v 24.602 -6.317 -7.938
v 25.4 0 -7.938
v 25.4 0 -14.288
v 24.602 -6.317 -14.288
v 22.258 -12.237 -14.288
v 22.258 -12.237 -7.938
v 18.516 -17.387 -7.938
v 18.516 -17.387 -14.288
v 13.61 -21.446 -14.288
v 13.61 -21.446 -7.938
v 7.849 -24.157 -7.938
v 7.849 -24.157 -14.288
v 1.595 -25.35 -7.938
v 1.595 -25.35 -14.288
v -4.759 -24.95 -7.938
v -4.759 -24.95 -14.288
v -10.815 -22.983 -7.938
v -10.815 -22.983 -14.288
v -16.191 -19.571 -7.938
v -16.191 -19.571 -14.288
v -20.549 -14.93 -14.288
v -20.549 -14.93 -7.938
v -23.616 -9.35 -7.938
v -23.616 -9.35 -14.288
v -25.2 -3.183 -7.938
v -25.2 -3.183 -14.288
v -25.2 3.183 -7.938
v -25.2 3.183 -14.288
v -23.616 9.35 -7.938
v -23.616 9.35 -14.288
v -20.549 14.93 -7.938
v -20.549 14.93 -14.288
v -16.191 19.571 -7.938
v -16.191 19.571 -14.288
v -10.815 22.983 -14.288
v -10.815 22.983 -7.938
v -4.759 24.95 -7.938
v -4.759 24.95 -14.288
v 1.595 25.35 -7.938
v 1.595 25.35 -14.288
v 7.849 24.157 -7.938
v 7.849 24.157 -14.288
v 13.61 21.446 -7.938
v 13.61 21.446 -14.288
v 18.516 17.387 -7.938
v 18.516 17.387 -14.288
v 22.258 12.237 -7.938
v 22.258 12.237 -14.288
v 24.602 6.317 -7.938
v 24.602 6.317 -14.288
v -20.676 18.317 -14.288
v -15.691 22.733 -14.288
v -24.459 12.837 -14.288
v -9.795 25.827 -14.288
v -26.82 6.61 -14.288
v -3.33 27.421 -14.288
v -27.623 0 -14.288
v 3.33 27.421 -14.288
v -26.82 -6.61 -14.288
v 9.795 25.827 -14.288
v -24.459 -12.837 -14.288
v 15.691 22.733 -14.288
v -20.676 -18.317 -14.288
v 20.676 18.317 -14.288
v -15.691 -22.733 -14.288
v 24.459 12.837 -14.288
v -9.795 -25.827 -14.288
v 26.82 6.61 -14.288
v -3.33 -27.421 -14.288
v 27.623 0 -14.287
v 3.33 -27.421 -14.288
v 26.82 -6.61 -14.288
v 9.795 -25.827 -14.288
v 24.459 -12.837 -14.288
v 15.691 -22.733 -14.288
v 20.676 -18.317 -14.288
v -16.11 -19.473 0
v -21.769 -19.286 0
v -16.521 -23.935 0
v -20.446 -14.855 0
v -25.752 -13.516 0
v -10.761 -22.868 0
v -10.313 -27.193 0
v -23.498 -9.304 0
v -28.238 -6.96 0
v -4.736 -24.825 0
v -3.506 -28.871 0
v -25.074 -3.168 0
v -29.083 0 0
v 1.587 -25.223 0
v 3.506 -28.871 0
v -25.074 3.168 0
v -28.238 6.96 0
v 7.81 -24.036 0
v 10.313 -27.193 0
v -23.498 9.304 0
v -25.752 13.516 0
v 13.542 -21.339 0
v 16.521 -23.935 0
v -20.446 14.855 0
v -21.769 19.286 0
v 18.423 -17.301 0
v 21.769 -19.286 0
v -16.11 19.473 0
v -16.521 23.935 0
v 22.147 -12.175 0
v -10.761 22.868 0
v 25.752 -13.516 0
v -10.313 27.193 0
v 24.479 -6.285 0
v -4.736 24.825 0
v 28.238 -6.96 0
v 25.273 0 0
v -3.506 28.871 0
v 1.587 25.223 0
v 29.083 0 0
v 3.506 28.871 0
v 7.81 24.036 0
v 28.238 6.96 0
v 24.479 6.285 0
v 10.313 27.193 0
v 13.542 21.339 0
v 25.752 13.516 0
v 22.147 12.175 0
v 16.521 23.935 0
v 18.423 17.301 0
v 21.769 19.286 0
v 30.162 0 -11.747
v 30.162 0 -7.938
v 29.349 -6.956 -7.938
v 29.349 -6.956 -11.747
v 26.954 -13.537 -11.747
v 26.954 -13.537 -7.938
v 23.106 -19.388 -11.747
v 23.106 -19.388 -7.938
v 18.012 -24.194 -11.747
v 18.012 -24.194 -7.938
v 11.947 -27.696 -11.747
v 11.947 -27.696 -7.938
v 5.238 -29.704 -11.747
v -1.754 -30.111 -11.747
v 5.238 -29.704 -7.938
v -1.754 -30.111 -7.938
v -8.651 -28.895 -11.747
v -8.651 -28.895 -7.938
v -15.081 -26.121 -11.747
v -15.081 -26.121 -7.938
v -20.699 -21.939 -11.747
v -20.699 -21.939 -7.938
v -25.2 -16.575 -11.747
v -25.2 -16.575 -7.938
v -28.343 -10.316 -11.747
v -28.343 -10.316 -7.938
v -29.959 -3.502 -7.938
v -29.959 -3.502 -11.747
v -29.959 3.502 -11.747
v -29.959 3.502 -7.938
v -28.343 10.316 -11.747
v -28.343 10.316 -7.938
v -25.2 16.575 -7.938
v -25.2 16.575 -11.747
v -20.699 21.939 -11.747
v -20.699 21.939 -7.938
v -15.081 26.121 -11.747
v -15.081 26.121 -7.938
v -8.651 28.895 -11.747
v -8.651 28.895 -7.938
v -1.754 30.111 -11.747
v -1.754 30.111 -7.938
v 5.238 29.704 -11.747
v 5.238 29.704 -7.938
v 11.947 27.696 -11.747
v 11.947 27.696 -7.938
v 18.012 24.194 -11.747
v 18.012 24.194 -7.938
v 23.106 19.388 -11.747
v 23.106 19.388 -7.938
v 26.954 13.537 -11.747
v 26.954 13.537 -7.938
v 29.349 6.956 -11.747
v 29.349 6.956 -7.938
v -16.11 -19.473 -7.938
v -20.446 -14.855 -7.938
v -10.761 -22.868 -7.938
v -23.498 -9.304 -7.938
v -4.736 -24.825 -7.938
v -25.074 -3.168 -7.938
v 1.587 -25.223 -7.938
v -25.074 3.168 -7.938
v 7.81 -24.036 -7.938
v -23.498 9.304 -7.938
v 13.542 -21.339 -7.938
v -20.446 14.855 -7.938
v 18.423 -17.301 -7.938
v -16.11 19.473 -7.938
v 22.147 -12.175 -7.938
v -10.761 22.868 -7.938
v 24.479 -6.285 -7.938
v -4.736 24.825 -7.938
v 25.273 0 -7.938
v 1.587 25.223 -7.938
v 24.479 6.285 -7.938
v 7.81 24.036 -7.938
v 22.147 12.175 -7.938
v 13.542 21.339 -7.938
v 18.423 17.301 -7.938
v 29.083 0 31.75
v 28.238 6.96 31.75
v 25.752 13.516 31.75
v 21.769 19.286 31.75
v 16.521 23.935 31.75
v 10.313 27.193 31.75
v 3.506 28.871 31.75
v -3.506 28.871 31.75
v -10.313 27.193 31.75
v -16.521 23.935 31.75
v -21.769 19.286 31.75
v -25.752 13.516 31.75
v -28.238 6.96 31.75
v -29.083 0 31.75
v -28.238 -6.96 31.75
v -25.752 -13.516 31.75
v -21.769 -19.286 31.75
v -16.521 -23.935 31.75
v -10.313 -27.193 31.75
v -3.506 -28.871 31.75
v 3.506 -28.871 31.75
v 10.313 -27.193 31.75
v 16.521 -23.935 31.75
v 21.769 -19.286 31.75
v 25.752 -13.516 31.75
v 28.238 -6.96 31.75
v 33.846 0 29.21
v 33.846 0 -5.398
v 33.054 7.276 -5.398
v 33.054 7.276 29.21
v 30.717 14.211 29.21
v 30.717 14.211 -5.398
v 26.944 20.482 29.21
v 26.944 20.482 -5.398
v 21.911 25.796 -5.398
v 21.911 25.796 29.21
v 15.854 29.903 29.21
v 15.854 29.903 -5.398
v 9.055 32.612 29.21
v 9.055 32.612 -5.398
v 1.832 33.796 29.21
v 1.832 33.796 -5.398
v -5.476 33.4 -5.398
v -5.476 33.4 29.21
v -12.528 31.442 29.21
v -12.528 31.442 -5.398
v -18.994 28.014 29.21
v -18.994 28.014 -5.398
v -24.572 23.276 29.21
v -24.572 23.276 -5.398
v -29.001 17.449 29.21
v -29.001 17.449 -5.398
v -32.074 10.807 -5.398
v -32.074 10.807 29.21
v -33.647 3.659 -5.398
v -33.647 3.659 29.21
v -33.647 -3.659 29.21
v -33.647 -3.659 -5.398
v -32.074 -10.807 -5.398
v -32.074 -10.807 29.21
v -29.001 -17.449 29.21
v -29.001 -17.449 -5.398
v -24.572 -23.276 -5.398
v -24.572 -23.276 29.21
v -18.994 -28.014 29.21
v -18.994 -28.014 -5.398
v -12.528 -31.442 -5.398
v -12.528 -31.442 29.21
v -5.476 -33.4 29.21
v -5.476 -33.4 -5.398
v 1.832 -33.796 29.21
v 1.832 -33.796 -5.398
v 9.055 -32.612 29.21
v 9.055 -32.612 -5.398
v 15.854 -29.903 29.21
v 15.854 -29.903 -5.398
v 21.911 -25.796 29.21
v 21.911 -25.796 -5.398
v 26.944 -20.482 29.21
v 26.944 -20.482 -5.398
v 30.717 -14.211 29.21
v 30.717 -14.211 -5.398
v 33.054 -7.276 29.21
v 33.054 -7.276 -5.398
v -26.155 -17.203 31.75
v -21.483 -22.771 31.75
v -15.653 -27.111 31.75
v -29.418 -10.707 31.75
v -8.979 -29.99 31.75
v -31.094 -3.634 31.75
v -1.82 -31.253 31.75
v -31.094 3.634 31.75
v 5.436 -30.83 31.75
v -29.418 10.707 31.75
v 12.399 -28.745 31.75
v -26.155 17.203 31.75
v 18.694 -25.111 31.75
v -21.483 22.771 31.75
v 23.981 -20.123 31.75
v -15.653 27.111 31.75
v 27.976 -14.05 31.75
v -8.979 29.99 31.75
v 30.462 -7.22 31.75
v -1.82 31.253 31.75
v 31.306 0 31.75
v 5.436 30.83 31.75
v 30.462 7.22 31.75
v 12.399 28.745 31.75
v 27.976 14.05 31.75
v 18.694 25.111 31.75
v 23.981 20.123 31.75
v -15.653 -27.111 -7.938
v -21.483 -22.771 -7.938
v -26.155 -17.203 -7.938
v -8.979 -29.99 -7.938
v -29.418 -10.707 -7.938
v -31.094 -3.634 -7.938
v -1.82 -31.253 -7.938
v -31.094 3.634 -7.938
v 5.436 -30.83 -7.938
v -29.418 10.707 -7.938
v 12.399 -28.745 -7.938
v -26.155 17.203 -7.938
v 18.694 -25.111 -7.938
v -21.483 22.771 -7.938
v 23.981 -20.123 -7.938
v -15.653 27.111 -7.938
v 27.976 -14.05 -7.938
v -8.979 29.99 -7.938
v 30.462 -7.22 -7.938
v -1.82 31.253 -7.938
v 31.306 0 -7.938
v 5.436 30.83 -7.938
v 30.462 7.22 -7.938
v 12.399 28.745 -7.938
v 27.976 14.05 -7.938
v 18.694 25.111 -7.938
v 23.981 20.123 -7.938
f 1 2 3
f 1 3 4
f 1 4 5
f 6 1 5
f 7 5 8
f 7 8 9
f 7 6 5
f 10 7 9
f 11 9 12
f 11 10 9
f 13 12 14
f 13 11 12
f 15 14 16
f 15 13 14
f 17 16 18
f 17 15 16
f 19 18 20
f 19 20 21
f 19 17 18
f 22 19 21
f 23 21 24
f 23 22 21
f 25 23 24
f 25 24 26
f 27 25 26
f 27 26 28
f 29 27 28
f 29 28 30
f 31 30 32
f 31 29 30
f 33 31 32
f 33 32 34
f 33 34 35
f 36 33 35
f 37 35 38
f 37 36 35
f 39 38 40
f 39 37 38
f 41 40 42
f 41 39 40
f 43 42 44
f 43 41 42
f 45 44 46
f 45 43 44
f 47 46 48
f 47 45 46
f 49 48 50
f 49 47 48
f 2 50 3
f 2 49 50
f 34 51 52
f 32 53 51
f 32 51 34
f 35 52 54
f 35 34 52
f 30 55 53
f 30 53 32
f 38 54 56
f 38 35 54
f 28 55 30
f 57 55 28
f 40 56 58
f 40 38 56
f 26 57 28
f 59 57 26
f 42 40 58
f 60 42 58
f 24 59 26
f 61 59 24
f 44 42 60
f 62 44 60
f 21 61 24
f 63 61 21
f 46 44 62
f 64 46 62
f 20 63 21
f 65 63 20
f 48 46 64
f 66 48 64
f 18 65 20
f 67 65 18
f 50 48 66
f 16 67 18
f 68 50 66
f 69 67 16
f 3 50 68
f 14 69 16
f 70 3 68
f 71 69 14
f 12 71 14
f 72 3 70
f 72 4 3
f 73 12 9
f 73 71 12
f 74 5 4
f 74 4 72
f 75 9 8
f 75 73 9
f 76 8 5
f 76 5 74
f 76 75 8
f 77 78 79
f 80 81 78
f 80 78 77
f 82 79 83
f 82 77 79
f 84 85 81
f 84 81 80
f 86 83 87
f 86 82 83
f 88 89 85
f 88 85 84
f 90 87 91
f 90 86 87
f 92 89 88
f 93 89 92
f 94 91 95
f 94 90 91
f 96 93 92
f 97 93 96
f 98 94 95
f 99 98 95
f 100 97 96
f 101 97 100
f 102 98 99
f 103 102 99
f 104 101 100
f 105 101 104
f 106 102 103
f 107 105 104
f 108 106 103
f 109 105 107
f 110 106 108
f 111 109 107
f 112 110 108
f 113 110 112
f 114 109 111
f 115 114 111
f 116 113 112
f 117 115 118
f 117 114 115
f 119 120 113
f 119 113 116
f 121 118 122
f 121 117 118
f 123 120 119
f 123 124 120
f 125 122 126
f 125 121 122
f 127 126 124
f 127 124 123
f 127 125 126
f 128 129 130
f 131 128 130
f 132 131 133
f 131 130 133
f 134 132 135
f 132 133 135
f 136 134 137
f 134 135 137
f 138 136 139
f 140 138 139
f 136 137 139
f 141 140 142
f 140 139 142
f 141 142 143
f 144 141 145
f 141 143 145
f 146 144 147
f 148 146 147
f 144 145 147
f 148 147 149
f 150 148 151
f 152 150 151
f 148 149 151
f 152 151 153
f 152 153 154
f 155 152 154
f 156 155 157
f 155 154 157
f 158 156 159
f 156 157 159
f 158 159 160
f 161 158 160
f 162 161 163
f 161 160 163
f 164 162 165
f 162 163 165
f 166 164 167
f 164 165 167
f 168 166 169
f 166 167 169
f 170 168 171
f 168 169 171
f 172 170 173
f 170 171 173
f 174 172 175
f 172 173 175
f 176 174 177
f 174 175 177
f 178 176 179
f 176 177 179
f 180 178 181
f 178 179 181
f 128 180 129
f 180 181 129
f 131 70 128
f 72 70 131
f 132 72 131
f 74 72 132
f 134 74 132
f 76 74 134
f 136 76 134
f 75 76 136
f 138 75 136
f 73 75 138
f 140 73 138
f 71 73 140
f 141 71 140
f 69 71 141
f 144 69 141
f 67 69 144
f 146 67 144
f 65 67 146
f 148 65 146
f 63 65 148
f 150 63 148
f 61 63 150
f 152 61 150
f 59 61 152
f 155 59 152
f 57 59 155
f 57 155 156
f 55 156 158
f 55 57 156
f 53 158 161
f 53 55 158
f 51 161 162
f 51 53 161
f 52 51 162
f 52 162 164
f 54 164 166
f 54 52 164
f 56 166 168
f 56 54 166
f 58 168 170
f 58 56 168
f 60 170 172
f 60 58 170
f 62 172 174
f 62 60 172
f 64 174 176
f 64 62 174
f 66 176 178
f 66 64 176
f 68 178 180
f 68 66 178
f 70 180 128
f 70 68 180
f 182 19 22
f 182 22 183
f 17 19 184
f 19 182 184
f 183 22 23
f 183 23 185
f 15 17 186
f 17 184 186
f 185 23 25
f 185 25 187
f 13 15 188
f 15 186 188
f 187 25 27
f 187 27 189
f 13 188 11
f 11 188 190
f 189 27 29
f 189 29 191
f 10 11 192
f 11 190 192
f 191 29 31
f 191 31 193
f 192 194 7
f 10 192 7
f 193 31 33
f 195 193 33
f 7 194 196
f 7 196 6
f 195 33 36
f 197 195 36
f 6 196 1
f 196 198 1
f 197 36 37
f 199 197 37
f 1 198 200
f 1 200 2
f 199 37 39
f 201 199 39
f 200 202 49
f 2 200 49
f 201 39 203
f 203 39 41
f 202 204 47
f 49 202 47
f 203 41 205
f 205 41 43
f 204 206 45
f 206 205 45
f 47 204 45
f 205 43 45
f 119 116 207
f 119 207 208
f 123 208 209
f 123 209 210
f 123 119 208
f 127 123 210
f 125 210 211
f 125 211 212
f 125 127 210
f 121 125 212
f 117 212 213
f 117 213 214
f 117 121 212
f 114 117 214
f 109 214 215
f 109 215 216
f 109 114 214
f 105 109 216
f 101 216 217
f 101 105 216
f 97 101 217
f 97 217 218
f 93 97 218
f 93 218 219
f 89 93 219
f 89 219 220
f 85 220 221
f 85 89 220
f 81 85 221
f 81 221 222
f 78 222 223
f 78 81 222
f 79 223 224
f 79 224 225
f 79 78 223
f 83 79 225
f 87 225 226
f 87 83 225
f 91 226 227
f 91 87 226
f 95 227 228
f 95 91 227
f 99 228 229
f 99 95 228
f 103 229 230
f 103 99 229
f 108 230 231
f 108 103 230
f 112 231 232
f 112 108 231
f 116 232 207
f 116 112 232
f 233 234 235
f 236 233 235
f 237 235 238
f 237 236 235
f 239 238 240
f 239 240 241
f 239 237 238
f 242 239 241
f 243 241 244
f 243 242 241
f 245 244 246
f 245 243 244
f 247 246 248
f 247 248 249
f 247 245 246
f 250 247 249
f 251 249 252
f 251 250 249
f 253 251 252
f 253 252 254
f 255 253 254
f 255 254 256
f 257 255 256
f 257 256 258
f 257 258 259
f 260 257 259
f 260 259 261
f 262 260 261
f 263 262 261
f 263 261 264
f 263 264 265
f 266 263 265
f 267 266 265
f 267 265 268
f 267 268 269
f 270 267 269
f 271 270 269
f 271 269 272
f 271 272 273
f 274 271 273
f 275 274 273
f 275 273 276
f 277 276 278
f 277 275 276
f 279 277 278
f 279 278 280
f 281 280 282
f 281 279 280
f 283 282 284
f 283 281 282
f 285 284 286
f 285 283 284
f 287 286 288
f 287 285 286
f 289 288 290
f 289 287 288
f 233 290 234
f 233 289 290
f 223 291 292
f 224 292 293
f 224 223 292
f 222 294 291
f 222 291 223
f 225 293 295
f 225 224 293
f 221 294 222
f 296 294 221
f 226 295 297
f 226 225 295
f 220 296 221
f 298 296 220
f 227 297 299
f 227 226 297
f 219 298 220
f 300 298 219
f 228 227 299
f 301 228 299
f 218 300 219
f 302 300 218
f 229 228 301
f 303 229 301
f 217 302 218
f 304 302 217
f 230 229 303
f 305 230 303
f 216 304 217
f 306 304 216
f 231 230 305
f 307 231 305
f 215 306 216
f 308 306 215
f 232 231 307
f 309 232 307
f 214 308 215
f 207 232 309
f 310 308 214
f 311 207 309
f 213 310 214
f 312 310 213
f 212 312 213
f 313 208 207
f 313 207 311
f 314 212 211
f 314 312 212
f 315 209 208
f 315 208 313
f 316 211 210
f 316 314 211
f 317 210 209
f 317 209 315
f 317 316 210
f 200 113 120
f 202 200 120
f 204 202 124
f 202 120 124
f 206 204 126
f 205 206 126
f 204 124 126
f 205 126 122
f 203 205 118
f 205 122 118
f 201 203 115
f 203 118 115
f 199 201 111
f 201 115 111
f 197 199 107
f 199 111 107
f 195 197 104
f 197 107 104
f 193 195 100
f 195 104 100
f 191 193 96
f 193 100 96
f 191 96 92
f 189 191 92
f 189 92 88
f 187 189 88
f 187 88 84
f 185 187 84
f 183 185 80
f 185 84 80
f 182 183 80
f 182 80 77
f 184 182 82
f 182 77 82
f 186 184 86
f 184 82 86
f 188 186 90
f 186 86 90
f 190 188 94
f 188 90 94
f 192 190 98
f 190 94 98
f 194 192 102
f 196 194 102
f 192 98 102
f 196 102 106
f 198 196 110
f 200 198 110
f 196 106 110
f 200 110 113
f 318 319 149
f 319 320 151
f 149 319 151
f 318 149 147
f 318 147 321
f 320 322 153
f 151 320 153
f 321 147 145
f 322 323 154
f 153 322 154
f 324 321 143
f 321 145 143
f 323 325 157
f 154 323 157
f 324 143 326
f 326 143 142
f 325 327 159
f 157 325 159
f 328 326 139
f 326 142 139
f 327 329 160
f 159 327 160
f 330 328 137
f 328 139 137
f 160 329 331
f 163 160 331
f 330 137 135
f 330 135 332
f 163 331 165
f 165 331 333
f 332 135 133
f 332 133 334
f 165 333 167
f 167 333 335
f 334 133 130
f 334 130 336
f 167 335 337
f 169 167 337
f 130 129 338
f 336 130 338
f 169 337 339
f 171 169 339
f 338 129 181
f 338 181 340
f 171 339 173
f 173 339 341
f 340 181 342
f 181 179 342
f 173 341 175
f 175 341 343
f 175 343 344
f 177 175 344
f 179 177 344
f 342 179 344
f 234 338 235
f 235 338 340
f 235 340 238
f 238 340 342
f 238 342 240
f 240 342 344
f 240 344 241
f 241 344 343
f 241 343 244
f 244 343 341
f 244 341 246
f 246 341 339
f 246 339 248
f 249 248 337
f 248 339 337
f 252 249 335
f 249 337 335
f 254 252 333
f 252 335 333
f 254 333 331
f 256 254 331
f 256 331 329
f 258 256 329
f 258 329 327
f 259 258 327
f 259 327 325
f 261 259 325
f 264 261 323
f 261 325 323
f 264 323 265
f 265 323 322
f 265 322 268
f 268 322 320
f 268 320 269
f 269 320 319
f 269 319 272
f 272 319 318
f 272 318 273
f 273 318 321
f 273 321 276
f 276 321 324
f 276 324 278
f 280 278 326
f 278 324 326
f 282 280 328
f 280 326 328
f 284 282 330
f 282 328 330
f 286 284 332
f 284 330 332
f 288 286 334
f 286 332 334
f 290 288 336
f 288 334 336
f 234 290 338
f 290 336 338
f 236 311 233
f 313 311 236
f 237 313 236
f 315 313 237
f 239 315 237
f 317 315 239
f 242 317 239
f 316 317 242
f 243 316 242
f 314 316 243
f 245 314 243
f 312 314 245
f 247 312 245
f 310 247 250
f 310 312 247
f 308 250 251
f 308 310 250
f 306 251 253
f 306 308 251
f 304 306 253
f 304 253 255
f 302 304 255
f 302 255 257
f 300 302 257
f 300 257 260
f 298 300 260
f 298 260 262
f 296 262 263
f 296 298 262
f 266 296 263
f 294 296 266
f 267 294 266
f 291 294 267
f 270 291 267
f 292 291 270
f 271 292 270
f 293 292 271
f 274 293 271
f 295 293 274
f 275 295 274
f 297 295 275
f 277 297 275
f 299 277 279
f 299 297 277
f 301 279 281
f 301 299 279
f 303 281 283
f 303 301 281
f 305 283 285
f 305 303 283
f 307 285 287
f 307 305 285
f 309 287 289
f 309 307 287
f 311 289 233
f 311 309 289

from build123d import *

# Parameters (mm, degrees)
F0_R     = 33.8455
F0_R_2   = 29.083
F1_DEPTH = 31.75
F0_R_3   = 25.273
F2_DEPTH = 7.9375
F3_R     = 30.1625
F3_R_2   = 25.4
F4_DEPTH = 6.35
F5_SIZE  = 2.54


with BuildPart() as f1:
    # F0 (on Top) → F1 (new body)
    with BuildSketch(Plane.XY):
        Circle(F0_R)
        Circle(F0_R_2, mode=Mode.SUBTRACT)
    extrude(amount=F1_DEPTH)

    # F0 (on Top) → F2 (join)
    with BuildSketch(Plane.XY):
        Circle(F0_R)
        Circle(F0_R_2, mode=Mode.SUBTRACT)
        Circle(F0_R_2)
        Circle(F0_R_3, mode=Mode.SUBTRACT)
    extrude(amount=-F2_DEPTH)

    # F3 (on face) → F4 (join)
    with BuildSketch(Plane(origin=(0, 0, -7.9375), x_dir=(1, 0, 0), z_dir=(0, 0, -1))):
        Circle(F3_R)
        Circle(F3_R_2, mode=Mode.SUBTRACT)
    extrude(amount=F4_DEPTH)

    # F5
    f5_edges = [f1.edges().sort_by_distance(p)[0] for p in [
        (-33.8455, 0, 31.75),
        (-33.8455, 0, -7.9375),
        (-30.1625, 0, -14.2875),
    ]]
    chamfer(f5_edges, length=F5_SIZE)


solid = f1.part
